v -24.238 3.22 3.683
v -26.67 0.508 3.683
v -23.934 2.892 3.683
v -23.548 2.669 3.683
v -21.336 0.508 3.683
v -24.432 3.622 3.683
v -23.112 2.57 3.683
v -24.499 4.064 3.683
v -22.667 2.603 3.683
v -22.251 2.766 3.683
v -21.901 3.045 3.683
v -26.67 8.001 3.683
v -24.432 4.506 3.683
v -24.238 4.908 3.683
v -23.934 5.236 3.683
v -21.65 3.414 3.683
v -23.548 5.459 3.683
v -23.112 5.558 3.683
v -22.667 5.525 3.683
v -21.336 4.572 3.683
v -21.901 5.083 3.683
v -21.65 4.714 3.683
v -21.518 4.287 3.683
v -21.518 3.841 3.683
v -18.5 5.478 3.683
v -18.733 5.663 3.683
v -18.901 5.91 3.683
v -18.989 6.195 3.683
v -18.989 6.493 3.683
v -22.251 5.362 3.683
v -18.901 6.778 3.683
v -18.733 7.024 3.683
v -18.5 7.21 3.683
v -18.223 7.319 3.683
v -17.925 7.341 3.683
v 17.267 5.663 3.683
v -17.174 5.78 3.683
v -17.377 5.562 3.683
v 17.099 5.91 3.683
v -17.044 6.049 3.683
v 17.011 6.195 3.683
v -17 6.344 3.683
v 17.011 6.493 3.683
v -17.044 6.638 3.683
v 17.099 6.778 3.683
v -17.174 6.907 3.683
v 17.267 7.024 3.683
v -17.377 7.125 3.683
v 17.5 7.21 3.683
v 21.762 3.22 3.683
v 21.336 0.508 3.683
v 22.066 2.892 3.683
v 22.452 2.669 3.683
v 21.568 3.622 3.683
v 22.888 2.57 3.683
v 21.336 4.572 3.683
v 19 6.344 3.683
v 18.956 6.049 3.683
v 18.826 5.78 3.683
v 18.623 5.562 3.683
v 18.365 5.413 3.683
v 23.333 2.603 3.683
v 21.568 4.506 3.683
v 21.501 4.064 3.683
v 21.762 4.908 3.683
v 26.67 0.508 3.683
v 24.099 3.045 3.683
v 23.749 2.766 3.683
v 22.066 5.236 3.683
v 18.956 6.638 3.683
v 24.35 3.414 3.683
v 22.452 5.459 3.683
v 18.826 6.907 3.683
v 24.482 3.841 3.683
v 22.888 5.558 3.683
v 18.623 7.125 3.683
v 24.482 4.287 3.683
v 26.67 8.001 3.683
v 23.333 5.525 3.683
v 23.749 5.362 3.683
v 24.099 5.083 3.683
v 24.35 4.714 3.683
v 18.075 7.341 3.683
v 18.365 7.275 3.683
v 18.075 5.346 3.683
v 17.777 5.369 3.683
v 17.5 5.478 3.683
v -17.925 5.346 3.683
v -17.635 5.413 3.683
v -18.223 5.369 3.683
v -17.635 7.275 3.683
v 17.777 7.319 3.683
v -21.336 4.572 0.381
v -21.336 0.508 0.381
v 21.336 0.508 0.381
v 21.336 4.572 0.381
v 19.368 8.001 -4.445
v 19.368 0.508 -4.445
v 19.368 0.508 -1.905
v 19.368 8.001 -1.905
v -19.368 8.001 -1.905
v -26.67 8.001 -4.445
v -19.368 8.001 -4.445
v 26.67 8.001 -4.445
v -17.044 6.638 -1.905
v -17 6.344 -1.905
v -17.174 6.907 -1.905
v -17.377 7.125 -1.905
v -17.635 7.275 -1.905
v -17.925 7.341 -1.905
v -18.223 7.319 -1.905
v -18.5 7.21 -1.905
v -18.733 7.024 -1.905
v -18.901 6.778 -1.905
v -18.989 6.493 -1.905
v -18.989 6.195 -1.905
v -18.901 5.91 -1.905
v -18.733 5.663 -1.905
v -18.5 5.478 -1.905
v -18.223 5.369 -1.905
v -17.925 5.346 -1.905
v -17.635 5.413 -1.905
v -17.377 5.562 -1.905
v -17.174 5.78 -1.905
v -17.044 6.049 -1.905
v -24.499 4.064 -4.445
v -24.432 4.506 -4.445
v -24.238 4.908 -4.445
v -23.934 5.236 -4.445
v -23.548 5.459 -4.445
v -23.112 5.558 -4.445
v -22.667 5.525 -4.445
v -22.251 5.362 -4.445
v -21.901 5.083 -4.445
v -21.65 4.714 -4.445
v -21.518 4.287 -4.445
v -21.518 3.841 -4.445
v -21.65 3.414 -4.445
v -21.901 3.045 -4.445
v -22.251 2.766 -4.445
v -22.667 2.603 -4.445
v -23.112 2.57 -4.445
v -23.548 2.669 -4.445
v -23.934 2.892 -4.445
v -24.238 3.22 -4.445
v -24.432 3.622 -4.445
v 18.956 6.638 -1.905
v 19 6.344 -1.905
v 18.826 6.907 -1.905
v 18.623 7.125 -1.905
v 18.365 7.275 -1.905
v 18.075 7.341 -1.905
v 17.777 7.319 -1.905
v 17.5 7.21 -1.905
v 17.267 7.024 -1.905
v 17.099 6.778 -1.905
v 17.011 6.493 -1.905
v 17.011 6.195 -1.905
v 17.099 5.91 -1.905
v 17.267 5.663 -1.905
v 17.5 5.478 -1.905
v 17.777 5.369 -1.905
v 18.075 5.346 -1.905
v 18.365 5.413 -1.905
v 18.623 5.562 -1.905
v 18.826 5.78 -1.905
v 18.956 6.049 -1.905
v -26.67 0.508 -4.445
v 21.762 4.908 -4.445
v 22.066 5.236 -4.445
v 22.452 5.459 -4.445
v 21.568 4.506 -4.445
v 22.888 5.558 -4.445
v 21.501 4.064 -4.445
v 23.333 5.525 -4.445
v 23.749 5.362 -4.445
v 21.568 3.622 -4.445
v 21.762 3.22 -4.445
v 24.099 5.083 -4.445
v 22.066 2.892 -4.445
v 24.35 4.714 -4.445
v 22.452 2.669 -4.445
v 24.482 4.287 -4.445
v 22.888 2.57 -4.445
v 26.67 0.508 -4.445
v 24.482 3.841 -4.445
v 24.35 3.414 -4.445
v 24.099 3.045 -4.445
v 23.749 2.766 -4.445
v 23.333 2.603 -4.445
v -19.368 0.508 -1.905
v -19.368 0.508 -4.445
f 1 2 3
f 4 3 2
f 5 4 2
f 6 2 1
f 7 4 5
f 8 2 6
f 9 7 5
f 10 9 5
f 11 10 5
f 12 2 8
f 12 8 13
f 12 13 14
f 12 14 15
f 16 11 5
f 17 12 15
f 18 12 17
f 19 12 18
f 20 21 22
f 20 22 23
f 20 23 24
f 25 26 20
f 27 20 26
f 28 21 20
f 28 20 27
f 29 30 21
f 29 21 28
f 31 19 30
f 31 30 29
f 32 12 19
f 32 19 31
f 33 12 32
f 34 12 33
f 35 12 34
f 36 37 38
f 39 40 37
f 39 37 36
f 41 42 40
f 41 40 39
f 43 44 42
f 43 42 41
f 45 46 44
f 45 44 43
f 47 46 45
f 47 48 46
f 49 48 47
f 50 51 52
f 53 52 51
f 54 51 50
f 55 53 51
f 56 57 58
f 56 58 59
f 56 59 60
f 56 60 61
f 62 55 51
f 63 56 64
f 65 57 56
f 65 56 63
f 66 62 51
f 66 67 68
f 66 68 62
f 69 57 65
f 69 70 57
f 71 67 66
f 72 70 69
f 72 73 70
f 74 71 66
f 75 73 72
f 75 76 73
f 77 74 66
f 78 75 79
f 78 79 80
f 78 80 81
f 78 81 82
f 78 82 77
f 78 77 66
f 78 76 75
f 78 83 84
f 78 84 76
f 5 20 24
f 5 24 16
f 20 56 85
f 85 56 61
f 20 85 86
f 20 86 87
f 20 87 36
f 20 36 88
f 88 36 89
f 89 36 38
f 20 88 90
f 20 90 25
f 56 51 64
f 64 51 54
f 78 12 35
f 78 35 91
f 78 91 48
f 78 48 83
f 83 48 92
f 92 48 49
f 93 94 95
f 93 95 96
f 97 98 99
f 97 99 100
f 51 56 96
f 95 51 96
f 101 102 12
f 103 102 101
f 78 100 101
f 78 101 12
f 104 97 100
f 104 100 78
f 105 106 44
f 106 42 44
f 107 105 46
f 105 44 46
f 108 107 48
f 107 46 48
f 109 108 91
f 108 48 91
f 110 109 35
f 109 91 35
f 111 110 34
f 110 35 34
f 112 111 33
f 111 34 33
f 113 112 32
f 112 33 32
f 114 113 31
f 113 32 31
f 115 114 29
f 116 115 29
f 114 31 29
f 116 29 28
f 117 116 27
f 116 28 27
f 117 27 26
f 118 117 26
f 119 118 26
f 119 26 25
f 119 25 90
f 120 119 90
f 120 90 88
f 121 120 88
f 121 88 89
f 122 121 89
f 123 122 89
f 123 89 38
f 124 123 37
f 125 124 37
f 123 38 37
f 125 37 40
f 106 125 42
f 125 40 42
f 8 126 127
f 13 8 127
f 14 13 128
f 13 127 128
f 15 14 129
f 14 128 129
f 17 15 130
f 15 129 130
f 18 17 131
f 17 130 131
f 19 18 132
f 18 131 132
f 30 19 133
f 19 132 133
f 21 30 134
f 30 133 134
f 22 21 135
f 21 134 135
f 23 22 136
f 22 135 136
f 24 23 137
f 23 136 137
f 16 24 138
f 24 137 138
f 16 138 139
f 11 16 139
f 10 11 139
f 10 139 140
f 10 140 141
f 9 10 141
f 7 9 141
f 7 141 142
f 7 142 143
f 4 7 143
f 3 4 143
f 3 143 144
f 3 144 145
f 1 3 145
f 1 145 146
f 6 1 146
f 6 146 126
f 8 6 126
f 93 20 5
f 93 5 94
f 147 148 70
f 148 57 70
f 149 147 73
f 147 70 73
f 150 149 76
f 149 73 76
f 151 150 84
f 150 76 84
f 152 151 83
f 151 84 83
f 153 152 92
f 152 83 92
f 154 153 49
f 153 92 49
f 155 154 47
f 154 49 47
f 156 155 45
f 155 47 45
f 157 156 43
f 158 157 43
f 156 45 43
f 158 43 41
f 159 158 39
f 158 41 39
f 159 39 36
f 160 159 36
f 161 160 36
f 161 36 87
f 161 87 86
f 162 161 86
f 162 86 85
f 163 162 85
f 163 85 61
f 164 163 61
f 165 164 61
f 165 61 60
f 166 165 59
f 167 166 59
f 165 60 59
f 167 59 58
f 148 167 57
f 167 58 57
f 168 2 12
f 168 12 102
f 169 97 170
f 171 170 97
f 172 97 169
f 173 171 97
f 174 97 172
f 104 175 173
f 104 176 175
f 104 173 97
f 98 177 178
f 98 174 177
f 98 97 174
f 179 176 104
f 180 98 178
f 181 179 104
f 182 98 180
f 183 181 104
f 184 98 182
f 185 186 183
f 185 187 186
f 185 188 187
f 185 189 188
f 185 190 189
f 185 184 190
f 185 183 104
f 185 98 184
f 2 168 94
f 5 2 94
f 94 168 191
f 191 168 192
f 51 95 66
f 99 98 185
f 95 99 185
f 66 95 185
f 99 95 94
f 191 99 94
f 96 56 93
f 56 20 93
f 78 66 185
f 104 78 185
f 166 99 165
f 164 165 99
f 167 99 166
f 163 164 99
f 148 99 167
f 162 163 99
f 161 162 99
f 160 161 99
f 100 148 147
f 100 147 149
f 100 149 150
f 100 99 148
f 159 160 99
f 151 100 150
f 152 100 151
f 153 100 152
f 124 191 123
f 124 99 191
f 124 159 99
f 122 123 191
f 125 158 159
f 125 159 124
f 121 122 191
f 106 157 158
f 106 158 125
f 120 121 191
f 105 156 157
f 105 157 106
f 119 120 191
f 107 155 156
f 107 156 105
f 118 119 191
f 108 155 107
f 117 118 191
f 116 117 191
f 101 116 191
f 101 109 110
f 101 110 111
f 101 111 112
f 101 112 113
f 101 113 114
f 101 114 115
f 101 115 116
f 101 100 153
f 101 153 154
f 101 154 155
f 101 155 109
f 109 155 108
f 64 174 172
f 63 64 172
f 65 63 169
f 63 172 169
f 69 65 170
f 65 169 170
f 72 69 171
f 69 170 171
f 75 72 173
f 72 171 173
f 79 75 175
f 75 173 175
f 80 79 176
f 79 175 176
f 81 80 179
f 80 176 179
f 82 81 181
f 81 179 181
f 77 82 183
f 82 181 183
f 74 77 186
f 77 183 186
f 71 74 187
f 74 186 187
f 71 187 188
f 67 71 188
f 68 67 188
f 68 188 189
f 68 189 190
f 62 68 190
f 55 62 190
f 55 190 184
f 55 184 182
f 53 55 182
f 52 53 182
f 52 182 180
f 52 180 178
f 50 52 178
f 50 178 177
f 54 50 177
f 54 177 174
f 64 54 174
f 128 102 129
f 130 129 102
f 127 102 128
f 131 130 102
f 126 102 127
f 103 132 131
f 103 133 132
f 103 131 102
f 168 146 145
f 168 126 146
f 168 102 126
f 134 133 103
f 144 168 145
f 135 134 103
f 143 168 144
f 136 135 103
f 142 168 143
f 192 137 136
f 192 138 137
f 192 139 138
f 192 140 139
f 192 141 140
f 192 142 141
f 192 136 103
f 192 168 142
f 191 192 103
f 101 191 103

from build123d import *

# Parameters (mm, degrees)
SKETCH1_W                                   = 53.34
SKETCH1_H                                   = 8.89
F_16X19MM_BAR_SAWN_IN_HALF_WIDTH_WISE_DEPTH = 15.4686
SKETCH2_W                                   = 53.34
SKETCH2_H                                   = 15.4686
CUT_EXTRUDE1_DEPTH                          = 0.762
SKETCH4_W                                   = 53.34
SKETCH4_H                                   = 8.128
CUT_EXTRUDE2_DEPTH                          = 7.9756
SKETCH5_W                                   = 3.302
SKETCH5_H                                   = 4.064
CUT_EXTRUDE3_DEPTH                          = 21.336
CUT_EXTRUDE3_DEPTH_BACK                     = 21.336
M3_CLEARANCE_REACH                          = 10.128
SKETCH6_R                                   = 1.4986
SKETCH7_R                                   = 1
TAPPED_M2_DEPTH                             = 4.683
TAPPED_M2_DEPTH_BACK                        = 5.445
SKETCH10_W                                  = 38.735
SKETCH10_H                                  = 7.493
CUT_EXTRUDE6_DEPTH                          = 2.54


with BuildPart() as part:
    # Sketch1 → 16x19mm bar sawn in half width wise (new body)
    with BuildSketch(Plane(origin=(0, 0.508, 0), x_dir=(1, 0, 0), z_dir=(0, 1, 0))):
        Rectangle(SKETCH1_W, SKETCH1_H)
    extrude(amount=F_16X19MM_BAR_SAWN_IN_HALF_WIDTH_WISE_DEPTH)

    # Sketch2 → Cut-Extrude1 (cut)
    with BuildSketch(Plane.XY.offset(4.445)):
        with Locations((0, 8.2423)):
            Rectangle(SKETCH2_W, SKETCH2_H)
    extrude(amount=-CUT_EXTRUDE1_DEPTH, mode=Mode.SUBTRACT)

    # Sketch4 → Cut-Extrude2 (cut)
    with BuildSketch(Plane(origin=(0, 15.9766, 0), x_dir=(1, 0, 0), z_dir=(0, 1, 0))):
        with Locations((0, 0.381)):
            Rectangle(SKETCH4_W, SKETCH4_H)
    extrude(amount=-CUT_EXTRUDE2_DEPTH, mode=Mode.SUBTRACT)

    # Sketch5 → Cut-Extrude3 (cut, two sides)
    with BuildSketch(Plane(origin=(0, 0, 0), x_dir=(0, 0, -1), z_dir=(1, 0, 0))) as cut_extrude3_sk:
        with Locations((-2.032, 2.54)):
            Rectangle(SKETCH5_W, SKETCH5_H)
    extrude(amount=CUT_EXTRUDE3_DEPTH, mode=Mode.SUBTRACT)
    extrude(cut_extrude3_sk.sketch, amount=-CUT_EXTRUDE3_DEPTH_BACK, mode=Mode.SUBTRACT)

    # Sketch6 → M3 Clearance (cut, up to next)
    with BuildSketch(Plane(origin=(0, 0, -4.445), x_dir=(-1, 0, 0), z_dir=(0, 0, -1)), mode=Mode.PRIVATE) as m3_clearance_sk1:
        with Locations((23, 4.064)):
            Circle(SKETCH6_R)
    m3_clearance_tool1 = extrude(m3_clearance_sk1.sketch, amount=-M3_CLEARANCE_REACH, mode=Mode.PRIVATE) & part.part
    add(m3_clearance_tool1.solids().sort_by_distance((-23, 4.064, -4.445))[0], mode=Mode.SUBTRACT)
    # Sketch6 → M3 Clearance (cut, up to next)
    with BuildSketch(Plane(origin=(0, 0, -4.445), x_dir=(-1, 0, 0), z_dir=(0, 0, -1)), mode=Mode.PRIVATE) as m3_clearance_sk2:
        with Locations((-23, 4.064)):
            Circle(SKETCH6_R)
    m3_clearance_tool2 = extrude(m3_clearance_sk2.sketch, amount=-M3_CLEARANCE_REACH, mode=Mode.PRIVATE) & part.part
    add(m3_clearance_tool2.solids().sort_by_distance((23, 4.064, -4.445))[0], mode=Mode.SUBTRACT)

    # Sketch7 → Tapped M2 (cut, two sides)
    with BuildSketch(Plane.XY) as tapped_m2_sk:
        with Locations((18, 6.343629359)):
            Circle(SKETCH7_R)
        with Locations((-18, 6.343629359)):
            Circle(SKETCH7_R)
    extrude(amount=TAPPED_M2_DEPTH, mode=Mode.SUBTRACT)
    extrude(tapped_m2_sk.sketch, amount=-TAPPED_M2_DEPTH_BACK, mode=Mode.SUBTRACT)

    # Sketch10 → Cut-Extrude6 (cut)
    with BuildSketch(Plane(origin=(0, 0, -4.445), x_dir=(-1, 0, 0), z_dir=(0, 0, -1))):
        with Locations((0, 4.2545)):
            Rectangle(SKETCH10_W, SKETCH10_H)
    extrude(amount=-CUT_EXTRUDE6_DEPTH, mode=Mode.SUBTRACT)


solid = part.part
